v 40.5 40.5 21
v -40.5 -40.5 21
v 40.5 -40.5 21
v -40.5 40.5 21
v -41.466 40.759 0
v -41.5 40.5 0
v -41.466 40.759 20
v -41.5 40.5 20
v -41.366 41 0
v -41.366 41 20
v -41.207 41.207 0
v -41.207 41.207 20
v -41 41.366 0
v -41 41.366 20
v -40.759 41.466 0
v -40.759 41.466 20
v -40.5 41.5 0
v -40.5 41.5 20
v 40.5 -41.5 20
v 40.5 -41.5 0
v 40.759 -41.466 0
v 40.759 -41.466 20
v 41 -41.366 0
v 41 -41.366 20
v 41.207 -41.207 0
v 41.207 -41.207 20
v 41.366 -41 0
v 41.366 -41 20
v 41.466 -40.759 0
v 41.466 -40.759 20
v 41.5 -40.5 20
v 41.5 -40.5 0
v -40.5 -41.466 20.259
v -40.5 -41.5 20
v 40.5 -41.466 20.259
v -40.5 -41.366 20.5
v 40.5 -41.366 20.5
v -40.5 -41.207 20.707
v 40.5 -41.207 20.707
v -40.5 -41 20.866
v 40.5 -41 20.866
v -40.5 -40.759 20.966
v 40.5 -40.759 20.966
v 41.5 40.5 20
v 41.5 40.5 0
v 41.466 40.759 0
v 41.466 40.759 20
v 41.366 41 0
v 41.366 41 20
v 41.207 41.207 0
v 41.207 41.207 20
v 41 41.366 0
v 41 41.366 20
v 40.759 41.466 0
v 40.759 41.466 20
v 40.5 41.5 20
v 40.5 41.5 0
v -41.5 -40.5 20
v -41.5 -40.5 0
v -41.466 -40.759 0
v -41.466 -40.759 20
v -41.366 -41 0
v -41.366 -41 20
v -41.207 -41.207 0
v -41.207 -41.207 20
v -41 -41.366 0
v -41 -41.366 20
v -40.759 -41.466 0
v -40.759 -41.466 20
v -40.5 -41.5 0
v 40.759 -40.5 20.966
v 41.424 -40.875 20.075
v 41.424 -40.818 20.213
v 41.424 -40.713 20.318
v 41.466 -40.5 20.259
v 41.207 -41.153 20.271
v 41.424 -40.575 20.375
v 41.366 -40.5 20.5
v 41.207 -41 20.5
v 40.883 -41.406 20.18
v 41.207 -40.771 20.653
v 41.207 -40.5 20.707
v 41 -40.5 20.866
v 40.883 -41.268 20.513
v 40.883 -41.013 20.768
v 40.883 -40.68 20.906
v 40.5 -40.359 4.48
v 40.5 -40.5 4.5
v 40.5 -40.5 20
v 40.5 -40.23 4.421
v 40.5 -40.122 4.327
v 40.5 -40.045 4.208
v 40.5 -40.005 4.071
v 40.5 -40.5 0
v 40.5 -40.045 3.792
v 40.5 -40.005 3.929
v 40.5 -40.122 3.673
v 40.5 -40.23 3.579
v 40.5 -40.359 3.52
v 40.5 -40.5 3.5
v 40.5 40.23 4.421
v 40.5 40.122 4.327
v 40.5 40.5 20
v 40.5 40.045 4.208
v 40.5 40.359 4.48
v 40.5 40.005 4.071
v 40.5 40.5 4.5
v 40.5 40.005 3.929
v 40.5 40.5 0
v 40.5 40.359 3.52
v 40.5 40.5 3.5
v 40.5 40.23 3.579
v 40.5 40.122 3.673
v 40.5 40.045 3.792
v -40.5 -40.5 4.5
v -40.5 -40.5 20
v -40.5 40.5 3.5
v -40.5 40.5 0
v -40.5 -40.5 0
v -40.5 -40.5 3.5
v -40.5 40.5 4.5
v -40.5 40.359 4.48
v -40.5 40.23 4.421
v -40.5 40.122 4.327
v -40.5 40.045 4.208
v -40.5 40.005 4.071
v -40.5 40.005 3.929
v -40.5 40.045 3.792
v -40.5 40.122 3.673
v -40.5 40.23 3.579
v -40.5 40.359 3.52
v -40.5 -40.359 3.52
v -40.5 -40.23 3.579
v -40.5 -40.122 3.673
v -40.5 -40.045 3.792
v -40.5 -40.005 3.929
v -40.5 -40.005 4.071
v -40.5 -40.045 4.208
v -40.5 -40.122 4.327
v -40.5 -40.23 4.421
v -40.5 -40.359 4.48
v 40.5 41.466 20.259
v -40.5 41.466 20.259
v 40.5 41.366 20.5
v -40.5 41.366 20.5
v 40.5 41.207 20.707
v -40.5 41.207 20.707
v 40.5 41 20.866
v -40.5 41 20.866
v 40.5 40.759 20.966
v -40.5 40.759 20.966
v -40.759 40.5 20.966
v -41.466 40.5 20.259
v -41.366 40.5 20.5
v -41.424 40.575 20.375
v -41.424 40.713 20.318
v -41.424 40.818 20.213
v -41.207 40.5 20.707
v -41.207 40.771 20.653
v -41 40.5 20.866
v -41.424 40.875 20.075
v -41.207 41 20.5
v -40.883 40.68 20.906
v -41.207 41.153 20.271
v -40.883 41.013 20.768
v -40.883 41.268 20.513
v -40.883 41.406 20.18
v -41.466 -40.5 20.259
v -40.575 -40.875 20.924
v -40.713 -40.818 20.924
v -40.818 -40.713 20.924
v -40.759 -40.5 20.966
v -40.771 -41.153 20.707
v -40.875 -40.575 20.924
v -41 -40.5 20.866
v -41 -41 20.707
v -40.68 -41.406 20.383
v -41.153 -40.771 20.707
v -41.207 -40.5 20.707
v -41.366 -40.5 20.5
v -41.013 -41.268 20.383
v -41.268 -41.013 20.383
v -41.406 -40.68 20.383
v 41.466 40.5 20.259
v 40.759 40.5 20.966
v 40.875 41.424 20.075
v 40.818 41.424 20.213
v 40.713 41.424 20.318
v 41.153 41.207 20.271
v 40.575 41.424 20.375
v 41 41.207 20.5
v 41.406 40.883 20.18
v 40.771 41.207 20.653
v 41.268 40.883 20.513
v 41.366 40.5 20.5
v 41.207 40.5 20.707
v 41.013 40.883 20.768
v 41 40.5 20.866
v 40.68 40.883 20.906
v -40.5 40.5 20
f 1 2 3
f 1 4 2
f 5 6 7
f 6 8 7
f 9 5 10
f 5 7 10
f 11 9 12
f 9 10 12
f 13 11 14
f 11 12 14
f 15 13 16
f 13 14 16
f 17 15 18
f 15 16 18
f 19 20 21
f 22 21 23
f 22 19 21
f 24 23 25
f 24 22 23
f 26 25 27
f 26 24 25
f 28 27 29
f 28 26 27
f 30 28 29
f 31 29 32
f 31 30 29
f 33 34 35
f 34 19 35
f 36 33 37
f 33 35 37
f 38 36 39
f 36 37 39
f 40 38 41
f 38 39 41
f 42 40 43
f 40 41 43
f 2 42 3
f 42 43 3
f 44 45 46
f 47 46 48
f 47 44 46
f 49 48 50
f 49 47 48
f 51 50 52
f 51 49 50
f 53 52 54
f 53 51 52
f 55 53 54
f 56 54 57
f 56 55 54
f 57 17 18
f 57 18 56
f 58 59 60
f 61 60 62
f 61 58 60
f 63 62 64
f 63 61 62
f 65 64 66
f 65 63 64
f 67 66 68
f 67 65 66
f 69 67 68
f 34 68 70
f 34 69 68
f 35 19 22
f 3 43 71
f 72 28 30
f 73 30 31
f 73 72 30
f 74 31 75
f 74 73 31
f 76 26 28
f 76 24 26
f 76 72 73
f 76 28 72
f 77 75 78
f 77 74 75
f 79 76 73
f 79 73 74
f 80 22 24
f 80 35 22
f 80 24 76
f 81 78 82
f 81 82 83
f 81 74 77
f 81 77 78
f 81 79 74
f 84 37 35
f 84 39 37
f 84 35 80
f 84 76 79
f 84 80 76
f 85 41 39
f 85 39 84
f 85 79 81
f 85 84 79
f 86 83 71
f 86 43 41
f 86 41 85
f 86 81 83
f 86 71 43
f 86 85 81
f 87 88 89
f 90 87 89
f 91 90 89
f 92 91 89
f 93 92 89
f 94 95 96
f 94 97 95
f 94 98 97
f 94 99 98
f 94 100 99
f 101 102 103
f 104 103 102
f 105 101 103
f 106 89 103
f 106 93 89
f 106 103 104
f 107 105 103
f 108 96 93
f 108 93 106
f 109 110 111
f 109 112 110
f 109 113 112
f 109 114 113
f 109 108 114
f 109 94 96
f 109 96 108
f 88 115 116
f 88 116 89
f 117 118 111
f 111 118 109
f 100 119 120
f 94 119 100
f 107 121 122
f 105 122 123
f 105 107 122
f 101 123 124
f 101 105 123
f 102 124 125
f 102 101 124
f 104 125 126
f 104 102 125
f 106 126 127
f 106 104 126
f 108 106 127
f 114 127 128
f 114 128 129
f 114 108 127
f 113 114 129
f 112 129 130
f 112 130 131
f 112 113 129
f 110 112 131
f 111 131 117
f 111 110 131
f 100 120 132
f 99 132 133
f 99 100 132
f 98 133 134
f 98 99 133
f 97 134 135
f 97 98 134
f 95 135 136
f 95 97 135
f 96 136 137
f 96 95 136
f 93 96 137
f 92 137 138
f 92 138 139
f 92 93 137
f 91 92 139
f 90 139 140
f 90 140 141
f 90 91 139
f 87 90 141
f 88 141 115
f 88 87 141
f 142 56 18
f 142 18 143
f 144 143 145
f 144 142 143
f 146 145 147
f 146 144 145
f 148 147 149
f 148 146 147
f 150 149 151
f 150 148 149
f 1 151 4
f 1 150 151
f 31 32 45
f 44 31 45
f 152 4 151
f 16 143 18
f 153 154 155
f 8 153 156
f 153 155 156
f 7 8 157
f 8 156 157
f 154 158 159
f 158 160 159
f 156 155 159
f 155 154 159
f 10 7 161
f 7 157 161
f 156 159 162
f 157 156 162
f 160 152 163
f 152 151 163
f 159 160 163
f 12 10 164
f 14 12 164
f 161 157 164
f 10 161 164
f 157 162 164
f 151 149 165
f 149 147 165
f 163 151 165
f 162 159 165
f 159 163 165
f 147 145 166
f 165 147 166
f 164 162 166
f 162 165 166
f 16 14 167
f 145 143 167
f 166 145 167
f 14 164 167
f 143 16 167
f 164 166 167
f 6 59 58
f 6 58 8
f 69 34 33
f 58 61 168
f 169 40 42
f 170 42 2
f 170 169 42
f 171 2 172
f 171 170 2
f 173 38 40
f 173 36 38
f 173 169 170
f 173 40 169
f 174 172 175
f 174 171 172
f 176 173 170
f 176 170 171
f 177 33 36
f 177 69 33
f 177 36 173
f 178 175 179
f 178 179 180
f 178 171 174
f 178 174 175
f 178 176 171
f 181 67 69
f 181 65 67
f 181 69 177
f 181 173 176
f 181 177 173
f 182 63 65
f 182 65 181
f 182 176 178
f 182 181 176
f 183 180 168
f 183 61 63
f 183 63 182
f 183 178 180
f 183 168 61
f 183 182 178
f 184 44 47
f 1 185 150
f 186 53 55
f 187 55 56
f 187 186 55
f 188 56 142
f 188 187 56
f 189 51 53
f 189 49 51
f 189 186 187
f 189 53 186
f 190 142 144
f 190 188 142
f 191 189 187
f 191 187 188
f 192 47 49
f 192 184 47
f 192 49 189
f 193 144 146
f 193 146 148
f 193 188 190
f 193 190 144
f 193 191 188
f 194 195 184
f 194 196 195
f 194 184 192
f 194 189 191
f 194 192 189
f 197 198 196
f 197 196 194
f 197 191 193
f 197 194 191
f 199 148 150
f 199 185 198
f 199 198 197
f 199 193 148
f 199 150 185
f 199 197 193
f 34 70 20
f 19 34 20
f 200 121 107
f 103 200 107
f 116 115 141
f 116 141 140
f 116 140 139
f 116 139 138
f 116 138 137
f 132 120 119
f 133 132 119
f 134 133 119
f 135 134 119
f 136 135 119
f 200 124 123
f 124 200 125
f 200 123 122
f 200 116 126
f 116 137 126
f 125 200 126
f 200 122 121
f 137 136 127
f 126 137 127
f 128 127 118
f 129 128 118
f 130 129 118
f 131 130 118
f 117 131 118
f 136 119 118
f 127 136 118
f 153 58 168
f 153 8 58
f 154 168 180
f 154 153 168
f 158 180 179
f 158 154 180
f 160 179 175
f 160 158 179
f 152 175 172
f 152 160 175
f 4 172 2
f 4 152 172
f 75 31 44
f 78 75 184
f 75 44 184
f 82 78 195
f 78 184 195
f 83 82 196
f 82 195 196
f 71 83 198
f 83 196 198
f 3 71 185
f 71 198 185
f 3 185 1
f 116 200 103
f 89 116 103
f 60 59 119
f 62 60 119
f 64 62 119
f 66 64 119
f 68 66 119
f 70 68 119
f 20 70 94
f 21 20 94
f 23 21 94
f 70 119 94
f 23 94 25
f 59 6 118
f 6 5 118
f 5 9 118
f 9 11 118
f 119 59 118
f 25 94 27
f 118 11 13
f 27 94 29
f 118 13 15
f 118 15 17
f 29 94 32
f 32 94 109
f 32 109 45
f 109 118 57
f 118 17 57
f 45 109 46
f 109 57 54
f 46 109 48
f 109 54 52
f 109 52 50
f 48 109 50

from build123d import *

# Parameters (mm, degrees)
SKETCH_W          = 81
SKETCH_H          = 81
PAD_DEPTH         = 20
POCKET_DEPTH      = 40.501
POCKET_DEPTH_BACK = -40.501
SKETCH001_W       = 83
SKETCH001_H       = 83
PAD001_DEPTH      = 21
FILLET_R          = 1


with BuildPart() as body:
    # Sketch → Pad (new body)
    with BuildSketch(Plane.XY):
        Rectangle(SKETCH_W, SKETCH_H)
    extrude(amount=PAD_DEPTH)

    # Sketch002 → Pocket (cut, two sides)
    with BuildSketch(Plane.YZ) as pocket_sk:
        with BuildLine():
            ThreePointArc((40.5, 4.5), (40, 4), (40.5, 3.5))
            Line((40.5, 4.5), (40.5, 3.5))
        make_face()
        with BuildLine():
            ThreePointArc((-40.5, 3.5), (-40, 4), (-40.5, 4.5))
            Line((-40.5, 3.5), (-40.5, 4.5))
        make_face()
    extrude(amount=-POCKET_DEPTH, mode=Mode.SUBTRACT)
    extrude(pocket_sk.sketch, amount=-POCKET_DEPTH_BACK, mode=Mode.SUBTRACT)


with BuildPart() as body001:
    # Sketch001 → Pad001 (new body)
    with BuildSketch(Plane.XY):
        Rectangle(SKETCH001_W, SKETCH001_H)
    extrude(amount=PAD001_DEPTH)

    # Fillet
    fillet_edges = [body001.edges().sort_by_distance(p)[0] for p in [
        (-41.5, -41.5, 10.5),
        (0, -41.5, 21),
        (41.5, -41.5, 10.5),
        (41.5, 0, 21),
        (41.5, 41.5, 10.5),
        (0, 41.5, 21),
        (-41.5, 0, 21),
        (-41.5, 41.5, 10.5),
    ]]
    fillet(fillet_edges, radius=FILLET_R)

    # Boolean: cut Body
    add(body.part, mode=Mode.SUBTRACT)


solid = body001.part
